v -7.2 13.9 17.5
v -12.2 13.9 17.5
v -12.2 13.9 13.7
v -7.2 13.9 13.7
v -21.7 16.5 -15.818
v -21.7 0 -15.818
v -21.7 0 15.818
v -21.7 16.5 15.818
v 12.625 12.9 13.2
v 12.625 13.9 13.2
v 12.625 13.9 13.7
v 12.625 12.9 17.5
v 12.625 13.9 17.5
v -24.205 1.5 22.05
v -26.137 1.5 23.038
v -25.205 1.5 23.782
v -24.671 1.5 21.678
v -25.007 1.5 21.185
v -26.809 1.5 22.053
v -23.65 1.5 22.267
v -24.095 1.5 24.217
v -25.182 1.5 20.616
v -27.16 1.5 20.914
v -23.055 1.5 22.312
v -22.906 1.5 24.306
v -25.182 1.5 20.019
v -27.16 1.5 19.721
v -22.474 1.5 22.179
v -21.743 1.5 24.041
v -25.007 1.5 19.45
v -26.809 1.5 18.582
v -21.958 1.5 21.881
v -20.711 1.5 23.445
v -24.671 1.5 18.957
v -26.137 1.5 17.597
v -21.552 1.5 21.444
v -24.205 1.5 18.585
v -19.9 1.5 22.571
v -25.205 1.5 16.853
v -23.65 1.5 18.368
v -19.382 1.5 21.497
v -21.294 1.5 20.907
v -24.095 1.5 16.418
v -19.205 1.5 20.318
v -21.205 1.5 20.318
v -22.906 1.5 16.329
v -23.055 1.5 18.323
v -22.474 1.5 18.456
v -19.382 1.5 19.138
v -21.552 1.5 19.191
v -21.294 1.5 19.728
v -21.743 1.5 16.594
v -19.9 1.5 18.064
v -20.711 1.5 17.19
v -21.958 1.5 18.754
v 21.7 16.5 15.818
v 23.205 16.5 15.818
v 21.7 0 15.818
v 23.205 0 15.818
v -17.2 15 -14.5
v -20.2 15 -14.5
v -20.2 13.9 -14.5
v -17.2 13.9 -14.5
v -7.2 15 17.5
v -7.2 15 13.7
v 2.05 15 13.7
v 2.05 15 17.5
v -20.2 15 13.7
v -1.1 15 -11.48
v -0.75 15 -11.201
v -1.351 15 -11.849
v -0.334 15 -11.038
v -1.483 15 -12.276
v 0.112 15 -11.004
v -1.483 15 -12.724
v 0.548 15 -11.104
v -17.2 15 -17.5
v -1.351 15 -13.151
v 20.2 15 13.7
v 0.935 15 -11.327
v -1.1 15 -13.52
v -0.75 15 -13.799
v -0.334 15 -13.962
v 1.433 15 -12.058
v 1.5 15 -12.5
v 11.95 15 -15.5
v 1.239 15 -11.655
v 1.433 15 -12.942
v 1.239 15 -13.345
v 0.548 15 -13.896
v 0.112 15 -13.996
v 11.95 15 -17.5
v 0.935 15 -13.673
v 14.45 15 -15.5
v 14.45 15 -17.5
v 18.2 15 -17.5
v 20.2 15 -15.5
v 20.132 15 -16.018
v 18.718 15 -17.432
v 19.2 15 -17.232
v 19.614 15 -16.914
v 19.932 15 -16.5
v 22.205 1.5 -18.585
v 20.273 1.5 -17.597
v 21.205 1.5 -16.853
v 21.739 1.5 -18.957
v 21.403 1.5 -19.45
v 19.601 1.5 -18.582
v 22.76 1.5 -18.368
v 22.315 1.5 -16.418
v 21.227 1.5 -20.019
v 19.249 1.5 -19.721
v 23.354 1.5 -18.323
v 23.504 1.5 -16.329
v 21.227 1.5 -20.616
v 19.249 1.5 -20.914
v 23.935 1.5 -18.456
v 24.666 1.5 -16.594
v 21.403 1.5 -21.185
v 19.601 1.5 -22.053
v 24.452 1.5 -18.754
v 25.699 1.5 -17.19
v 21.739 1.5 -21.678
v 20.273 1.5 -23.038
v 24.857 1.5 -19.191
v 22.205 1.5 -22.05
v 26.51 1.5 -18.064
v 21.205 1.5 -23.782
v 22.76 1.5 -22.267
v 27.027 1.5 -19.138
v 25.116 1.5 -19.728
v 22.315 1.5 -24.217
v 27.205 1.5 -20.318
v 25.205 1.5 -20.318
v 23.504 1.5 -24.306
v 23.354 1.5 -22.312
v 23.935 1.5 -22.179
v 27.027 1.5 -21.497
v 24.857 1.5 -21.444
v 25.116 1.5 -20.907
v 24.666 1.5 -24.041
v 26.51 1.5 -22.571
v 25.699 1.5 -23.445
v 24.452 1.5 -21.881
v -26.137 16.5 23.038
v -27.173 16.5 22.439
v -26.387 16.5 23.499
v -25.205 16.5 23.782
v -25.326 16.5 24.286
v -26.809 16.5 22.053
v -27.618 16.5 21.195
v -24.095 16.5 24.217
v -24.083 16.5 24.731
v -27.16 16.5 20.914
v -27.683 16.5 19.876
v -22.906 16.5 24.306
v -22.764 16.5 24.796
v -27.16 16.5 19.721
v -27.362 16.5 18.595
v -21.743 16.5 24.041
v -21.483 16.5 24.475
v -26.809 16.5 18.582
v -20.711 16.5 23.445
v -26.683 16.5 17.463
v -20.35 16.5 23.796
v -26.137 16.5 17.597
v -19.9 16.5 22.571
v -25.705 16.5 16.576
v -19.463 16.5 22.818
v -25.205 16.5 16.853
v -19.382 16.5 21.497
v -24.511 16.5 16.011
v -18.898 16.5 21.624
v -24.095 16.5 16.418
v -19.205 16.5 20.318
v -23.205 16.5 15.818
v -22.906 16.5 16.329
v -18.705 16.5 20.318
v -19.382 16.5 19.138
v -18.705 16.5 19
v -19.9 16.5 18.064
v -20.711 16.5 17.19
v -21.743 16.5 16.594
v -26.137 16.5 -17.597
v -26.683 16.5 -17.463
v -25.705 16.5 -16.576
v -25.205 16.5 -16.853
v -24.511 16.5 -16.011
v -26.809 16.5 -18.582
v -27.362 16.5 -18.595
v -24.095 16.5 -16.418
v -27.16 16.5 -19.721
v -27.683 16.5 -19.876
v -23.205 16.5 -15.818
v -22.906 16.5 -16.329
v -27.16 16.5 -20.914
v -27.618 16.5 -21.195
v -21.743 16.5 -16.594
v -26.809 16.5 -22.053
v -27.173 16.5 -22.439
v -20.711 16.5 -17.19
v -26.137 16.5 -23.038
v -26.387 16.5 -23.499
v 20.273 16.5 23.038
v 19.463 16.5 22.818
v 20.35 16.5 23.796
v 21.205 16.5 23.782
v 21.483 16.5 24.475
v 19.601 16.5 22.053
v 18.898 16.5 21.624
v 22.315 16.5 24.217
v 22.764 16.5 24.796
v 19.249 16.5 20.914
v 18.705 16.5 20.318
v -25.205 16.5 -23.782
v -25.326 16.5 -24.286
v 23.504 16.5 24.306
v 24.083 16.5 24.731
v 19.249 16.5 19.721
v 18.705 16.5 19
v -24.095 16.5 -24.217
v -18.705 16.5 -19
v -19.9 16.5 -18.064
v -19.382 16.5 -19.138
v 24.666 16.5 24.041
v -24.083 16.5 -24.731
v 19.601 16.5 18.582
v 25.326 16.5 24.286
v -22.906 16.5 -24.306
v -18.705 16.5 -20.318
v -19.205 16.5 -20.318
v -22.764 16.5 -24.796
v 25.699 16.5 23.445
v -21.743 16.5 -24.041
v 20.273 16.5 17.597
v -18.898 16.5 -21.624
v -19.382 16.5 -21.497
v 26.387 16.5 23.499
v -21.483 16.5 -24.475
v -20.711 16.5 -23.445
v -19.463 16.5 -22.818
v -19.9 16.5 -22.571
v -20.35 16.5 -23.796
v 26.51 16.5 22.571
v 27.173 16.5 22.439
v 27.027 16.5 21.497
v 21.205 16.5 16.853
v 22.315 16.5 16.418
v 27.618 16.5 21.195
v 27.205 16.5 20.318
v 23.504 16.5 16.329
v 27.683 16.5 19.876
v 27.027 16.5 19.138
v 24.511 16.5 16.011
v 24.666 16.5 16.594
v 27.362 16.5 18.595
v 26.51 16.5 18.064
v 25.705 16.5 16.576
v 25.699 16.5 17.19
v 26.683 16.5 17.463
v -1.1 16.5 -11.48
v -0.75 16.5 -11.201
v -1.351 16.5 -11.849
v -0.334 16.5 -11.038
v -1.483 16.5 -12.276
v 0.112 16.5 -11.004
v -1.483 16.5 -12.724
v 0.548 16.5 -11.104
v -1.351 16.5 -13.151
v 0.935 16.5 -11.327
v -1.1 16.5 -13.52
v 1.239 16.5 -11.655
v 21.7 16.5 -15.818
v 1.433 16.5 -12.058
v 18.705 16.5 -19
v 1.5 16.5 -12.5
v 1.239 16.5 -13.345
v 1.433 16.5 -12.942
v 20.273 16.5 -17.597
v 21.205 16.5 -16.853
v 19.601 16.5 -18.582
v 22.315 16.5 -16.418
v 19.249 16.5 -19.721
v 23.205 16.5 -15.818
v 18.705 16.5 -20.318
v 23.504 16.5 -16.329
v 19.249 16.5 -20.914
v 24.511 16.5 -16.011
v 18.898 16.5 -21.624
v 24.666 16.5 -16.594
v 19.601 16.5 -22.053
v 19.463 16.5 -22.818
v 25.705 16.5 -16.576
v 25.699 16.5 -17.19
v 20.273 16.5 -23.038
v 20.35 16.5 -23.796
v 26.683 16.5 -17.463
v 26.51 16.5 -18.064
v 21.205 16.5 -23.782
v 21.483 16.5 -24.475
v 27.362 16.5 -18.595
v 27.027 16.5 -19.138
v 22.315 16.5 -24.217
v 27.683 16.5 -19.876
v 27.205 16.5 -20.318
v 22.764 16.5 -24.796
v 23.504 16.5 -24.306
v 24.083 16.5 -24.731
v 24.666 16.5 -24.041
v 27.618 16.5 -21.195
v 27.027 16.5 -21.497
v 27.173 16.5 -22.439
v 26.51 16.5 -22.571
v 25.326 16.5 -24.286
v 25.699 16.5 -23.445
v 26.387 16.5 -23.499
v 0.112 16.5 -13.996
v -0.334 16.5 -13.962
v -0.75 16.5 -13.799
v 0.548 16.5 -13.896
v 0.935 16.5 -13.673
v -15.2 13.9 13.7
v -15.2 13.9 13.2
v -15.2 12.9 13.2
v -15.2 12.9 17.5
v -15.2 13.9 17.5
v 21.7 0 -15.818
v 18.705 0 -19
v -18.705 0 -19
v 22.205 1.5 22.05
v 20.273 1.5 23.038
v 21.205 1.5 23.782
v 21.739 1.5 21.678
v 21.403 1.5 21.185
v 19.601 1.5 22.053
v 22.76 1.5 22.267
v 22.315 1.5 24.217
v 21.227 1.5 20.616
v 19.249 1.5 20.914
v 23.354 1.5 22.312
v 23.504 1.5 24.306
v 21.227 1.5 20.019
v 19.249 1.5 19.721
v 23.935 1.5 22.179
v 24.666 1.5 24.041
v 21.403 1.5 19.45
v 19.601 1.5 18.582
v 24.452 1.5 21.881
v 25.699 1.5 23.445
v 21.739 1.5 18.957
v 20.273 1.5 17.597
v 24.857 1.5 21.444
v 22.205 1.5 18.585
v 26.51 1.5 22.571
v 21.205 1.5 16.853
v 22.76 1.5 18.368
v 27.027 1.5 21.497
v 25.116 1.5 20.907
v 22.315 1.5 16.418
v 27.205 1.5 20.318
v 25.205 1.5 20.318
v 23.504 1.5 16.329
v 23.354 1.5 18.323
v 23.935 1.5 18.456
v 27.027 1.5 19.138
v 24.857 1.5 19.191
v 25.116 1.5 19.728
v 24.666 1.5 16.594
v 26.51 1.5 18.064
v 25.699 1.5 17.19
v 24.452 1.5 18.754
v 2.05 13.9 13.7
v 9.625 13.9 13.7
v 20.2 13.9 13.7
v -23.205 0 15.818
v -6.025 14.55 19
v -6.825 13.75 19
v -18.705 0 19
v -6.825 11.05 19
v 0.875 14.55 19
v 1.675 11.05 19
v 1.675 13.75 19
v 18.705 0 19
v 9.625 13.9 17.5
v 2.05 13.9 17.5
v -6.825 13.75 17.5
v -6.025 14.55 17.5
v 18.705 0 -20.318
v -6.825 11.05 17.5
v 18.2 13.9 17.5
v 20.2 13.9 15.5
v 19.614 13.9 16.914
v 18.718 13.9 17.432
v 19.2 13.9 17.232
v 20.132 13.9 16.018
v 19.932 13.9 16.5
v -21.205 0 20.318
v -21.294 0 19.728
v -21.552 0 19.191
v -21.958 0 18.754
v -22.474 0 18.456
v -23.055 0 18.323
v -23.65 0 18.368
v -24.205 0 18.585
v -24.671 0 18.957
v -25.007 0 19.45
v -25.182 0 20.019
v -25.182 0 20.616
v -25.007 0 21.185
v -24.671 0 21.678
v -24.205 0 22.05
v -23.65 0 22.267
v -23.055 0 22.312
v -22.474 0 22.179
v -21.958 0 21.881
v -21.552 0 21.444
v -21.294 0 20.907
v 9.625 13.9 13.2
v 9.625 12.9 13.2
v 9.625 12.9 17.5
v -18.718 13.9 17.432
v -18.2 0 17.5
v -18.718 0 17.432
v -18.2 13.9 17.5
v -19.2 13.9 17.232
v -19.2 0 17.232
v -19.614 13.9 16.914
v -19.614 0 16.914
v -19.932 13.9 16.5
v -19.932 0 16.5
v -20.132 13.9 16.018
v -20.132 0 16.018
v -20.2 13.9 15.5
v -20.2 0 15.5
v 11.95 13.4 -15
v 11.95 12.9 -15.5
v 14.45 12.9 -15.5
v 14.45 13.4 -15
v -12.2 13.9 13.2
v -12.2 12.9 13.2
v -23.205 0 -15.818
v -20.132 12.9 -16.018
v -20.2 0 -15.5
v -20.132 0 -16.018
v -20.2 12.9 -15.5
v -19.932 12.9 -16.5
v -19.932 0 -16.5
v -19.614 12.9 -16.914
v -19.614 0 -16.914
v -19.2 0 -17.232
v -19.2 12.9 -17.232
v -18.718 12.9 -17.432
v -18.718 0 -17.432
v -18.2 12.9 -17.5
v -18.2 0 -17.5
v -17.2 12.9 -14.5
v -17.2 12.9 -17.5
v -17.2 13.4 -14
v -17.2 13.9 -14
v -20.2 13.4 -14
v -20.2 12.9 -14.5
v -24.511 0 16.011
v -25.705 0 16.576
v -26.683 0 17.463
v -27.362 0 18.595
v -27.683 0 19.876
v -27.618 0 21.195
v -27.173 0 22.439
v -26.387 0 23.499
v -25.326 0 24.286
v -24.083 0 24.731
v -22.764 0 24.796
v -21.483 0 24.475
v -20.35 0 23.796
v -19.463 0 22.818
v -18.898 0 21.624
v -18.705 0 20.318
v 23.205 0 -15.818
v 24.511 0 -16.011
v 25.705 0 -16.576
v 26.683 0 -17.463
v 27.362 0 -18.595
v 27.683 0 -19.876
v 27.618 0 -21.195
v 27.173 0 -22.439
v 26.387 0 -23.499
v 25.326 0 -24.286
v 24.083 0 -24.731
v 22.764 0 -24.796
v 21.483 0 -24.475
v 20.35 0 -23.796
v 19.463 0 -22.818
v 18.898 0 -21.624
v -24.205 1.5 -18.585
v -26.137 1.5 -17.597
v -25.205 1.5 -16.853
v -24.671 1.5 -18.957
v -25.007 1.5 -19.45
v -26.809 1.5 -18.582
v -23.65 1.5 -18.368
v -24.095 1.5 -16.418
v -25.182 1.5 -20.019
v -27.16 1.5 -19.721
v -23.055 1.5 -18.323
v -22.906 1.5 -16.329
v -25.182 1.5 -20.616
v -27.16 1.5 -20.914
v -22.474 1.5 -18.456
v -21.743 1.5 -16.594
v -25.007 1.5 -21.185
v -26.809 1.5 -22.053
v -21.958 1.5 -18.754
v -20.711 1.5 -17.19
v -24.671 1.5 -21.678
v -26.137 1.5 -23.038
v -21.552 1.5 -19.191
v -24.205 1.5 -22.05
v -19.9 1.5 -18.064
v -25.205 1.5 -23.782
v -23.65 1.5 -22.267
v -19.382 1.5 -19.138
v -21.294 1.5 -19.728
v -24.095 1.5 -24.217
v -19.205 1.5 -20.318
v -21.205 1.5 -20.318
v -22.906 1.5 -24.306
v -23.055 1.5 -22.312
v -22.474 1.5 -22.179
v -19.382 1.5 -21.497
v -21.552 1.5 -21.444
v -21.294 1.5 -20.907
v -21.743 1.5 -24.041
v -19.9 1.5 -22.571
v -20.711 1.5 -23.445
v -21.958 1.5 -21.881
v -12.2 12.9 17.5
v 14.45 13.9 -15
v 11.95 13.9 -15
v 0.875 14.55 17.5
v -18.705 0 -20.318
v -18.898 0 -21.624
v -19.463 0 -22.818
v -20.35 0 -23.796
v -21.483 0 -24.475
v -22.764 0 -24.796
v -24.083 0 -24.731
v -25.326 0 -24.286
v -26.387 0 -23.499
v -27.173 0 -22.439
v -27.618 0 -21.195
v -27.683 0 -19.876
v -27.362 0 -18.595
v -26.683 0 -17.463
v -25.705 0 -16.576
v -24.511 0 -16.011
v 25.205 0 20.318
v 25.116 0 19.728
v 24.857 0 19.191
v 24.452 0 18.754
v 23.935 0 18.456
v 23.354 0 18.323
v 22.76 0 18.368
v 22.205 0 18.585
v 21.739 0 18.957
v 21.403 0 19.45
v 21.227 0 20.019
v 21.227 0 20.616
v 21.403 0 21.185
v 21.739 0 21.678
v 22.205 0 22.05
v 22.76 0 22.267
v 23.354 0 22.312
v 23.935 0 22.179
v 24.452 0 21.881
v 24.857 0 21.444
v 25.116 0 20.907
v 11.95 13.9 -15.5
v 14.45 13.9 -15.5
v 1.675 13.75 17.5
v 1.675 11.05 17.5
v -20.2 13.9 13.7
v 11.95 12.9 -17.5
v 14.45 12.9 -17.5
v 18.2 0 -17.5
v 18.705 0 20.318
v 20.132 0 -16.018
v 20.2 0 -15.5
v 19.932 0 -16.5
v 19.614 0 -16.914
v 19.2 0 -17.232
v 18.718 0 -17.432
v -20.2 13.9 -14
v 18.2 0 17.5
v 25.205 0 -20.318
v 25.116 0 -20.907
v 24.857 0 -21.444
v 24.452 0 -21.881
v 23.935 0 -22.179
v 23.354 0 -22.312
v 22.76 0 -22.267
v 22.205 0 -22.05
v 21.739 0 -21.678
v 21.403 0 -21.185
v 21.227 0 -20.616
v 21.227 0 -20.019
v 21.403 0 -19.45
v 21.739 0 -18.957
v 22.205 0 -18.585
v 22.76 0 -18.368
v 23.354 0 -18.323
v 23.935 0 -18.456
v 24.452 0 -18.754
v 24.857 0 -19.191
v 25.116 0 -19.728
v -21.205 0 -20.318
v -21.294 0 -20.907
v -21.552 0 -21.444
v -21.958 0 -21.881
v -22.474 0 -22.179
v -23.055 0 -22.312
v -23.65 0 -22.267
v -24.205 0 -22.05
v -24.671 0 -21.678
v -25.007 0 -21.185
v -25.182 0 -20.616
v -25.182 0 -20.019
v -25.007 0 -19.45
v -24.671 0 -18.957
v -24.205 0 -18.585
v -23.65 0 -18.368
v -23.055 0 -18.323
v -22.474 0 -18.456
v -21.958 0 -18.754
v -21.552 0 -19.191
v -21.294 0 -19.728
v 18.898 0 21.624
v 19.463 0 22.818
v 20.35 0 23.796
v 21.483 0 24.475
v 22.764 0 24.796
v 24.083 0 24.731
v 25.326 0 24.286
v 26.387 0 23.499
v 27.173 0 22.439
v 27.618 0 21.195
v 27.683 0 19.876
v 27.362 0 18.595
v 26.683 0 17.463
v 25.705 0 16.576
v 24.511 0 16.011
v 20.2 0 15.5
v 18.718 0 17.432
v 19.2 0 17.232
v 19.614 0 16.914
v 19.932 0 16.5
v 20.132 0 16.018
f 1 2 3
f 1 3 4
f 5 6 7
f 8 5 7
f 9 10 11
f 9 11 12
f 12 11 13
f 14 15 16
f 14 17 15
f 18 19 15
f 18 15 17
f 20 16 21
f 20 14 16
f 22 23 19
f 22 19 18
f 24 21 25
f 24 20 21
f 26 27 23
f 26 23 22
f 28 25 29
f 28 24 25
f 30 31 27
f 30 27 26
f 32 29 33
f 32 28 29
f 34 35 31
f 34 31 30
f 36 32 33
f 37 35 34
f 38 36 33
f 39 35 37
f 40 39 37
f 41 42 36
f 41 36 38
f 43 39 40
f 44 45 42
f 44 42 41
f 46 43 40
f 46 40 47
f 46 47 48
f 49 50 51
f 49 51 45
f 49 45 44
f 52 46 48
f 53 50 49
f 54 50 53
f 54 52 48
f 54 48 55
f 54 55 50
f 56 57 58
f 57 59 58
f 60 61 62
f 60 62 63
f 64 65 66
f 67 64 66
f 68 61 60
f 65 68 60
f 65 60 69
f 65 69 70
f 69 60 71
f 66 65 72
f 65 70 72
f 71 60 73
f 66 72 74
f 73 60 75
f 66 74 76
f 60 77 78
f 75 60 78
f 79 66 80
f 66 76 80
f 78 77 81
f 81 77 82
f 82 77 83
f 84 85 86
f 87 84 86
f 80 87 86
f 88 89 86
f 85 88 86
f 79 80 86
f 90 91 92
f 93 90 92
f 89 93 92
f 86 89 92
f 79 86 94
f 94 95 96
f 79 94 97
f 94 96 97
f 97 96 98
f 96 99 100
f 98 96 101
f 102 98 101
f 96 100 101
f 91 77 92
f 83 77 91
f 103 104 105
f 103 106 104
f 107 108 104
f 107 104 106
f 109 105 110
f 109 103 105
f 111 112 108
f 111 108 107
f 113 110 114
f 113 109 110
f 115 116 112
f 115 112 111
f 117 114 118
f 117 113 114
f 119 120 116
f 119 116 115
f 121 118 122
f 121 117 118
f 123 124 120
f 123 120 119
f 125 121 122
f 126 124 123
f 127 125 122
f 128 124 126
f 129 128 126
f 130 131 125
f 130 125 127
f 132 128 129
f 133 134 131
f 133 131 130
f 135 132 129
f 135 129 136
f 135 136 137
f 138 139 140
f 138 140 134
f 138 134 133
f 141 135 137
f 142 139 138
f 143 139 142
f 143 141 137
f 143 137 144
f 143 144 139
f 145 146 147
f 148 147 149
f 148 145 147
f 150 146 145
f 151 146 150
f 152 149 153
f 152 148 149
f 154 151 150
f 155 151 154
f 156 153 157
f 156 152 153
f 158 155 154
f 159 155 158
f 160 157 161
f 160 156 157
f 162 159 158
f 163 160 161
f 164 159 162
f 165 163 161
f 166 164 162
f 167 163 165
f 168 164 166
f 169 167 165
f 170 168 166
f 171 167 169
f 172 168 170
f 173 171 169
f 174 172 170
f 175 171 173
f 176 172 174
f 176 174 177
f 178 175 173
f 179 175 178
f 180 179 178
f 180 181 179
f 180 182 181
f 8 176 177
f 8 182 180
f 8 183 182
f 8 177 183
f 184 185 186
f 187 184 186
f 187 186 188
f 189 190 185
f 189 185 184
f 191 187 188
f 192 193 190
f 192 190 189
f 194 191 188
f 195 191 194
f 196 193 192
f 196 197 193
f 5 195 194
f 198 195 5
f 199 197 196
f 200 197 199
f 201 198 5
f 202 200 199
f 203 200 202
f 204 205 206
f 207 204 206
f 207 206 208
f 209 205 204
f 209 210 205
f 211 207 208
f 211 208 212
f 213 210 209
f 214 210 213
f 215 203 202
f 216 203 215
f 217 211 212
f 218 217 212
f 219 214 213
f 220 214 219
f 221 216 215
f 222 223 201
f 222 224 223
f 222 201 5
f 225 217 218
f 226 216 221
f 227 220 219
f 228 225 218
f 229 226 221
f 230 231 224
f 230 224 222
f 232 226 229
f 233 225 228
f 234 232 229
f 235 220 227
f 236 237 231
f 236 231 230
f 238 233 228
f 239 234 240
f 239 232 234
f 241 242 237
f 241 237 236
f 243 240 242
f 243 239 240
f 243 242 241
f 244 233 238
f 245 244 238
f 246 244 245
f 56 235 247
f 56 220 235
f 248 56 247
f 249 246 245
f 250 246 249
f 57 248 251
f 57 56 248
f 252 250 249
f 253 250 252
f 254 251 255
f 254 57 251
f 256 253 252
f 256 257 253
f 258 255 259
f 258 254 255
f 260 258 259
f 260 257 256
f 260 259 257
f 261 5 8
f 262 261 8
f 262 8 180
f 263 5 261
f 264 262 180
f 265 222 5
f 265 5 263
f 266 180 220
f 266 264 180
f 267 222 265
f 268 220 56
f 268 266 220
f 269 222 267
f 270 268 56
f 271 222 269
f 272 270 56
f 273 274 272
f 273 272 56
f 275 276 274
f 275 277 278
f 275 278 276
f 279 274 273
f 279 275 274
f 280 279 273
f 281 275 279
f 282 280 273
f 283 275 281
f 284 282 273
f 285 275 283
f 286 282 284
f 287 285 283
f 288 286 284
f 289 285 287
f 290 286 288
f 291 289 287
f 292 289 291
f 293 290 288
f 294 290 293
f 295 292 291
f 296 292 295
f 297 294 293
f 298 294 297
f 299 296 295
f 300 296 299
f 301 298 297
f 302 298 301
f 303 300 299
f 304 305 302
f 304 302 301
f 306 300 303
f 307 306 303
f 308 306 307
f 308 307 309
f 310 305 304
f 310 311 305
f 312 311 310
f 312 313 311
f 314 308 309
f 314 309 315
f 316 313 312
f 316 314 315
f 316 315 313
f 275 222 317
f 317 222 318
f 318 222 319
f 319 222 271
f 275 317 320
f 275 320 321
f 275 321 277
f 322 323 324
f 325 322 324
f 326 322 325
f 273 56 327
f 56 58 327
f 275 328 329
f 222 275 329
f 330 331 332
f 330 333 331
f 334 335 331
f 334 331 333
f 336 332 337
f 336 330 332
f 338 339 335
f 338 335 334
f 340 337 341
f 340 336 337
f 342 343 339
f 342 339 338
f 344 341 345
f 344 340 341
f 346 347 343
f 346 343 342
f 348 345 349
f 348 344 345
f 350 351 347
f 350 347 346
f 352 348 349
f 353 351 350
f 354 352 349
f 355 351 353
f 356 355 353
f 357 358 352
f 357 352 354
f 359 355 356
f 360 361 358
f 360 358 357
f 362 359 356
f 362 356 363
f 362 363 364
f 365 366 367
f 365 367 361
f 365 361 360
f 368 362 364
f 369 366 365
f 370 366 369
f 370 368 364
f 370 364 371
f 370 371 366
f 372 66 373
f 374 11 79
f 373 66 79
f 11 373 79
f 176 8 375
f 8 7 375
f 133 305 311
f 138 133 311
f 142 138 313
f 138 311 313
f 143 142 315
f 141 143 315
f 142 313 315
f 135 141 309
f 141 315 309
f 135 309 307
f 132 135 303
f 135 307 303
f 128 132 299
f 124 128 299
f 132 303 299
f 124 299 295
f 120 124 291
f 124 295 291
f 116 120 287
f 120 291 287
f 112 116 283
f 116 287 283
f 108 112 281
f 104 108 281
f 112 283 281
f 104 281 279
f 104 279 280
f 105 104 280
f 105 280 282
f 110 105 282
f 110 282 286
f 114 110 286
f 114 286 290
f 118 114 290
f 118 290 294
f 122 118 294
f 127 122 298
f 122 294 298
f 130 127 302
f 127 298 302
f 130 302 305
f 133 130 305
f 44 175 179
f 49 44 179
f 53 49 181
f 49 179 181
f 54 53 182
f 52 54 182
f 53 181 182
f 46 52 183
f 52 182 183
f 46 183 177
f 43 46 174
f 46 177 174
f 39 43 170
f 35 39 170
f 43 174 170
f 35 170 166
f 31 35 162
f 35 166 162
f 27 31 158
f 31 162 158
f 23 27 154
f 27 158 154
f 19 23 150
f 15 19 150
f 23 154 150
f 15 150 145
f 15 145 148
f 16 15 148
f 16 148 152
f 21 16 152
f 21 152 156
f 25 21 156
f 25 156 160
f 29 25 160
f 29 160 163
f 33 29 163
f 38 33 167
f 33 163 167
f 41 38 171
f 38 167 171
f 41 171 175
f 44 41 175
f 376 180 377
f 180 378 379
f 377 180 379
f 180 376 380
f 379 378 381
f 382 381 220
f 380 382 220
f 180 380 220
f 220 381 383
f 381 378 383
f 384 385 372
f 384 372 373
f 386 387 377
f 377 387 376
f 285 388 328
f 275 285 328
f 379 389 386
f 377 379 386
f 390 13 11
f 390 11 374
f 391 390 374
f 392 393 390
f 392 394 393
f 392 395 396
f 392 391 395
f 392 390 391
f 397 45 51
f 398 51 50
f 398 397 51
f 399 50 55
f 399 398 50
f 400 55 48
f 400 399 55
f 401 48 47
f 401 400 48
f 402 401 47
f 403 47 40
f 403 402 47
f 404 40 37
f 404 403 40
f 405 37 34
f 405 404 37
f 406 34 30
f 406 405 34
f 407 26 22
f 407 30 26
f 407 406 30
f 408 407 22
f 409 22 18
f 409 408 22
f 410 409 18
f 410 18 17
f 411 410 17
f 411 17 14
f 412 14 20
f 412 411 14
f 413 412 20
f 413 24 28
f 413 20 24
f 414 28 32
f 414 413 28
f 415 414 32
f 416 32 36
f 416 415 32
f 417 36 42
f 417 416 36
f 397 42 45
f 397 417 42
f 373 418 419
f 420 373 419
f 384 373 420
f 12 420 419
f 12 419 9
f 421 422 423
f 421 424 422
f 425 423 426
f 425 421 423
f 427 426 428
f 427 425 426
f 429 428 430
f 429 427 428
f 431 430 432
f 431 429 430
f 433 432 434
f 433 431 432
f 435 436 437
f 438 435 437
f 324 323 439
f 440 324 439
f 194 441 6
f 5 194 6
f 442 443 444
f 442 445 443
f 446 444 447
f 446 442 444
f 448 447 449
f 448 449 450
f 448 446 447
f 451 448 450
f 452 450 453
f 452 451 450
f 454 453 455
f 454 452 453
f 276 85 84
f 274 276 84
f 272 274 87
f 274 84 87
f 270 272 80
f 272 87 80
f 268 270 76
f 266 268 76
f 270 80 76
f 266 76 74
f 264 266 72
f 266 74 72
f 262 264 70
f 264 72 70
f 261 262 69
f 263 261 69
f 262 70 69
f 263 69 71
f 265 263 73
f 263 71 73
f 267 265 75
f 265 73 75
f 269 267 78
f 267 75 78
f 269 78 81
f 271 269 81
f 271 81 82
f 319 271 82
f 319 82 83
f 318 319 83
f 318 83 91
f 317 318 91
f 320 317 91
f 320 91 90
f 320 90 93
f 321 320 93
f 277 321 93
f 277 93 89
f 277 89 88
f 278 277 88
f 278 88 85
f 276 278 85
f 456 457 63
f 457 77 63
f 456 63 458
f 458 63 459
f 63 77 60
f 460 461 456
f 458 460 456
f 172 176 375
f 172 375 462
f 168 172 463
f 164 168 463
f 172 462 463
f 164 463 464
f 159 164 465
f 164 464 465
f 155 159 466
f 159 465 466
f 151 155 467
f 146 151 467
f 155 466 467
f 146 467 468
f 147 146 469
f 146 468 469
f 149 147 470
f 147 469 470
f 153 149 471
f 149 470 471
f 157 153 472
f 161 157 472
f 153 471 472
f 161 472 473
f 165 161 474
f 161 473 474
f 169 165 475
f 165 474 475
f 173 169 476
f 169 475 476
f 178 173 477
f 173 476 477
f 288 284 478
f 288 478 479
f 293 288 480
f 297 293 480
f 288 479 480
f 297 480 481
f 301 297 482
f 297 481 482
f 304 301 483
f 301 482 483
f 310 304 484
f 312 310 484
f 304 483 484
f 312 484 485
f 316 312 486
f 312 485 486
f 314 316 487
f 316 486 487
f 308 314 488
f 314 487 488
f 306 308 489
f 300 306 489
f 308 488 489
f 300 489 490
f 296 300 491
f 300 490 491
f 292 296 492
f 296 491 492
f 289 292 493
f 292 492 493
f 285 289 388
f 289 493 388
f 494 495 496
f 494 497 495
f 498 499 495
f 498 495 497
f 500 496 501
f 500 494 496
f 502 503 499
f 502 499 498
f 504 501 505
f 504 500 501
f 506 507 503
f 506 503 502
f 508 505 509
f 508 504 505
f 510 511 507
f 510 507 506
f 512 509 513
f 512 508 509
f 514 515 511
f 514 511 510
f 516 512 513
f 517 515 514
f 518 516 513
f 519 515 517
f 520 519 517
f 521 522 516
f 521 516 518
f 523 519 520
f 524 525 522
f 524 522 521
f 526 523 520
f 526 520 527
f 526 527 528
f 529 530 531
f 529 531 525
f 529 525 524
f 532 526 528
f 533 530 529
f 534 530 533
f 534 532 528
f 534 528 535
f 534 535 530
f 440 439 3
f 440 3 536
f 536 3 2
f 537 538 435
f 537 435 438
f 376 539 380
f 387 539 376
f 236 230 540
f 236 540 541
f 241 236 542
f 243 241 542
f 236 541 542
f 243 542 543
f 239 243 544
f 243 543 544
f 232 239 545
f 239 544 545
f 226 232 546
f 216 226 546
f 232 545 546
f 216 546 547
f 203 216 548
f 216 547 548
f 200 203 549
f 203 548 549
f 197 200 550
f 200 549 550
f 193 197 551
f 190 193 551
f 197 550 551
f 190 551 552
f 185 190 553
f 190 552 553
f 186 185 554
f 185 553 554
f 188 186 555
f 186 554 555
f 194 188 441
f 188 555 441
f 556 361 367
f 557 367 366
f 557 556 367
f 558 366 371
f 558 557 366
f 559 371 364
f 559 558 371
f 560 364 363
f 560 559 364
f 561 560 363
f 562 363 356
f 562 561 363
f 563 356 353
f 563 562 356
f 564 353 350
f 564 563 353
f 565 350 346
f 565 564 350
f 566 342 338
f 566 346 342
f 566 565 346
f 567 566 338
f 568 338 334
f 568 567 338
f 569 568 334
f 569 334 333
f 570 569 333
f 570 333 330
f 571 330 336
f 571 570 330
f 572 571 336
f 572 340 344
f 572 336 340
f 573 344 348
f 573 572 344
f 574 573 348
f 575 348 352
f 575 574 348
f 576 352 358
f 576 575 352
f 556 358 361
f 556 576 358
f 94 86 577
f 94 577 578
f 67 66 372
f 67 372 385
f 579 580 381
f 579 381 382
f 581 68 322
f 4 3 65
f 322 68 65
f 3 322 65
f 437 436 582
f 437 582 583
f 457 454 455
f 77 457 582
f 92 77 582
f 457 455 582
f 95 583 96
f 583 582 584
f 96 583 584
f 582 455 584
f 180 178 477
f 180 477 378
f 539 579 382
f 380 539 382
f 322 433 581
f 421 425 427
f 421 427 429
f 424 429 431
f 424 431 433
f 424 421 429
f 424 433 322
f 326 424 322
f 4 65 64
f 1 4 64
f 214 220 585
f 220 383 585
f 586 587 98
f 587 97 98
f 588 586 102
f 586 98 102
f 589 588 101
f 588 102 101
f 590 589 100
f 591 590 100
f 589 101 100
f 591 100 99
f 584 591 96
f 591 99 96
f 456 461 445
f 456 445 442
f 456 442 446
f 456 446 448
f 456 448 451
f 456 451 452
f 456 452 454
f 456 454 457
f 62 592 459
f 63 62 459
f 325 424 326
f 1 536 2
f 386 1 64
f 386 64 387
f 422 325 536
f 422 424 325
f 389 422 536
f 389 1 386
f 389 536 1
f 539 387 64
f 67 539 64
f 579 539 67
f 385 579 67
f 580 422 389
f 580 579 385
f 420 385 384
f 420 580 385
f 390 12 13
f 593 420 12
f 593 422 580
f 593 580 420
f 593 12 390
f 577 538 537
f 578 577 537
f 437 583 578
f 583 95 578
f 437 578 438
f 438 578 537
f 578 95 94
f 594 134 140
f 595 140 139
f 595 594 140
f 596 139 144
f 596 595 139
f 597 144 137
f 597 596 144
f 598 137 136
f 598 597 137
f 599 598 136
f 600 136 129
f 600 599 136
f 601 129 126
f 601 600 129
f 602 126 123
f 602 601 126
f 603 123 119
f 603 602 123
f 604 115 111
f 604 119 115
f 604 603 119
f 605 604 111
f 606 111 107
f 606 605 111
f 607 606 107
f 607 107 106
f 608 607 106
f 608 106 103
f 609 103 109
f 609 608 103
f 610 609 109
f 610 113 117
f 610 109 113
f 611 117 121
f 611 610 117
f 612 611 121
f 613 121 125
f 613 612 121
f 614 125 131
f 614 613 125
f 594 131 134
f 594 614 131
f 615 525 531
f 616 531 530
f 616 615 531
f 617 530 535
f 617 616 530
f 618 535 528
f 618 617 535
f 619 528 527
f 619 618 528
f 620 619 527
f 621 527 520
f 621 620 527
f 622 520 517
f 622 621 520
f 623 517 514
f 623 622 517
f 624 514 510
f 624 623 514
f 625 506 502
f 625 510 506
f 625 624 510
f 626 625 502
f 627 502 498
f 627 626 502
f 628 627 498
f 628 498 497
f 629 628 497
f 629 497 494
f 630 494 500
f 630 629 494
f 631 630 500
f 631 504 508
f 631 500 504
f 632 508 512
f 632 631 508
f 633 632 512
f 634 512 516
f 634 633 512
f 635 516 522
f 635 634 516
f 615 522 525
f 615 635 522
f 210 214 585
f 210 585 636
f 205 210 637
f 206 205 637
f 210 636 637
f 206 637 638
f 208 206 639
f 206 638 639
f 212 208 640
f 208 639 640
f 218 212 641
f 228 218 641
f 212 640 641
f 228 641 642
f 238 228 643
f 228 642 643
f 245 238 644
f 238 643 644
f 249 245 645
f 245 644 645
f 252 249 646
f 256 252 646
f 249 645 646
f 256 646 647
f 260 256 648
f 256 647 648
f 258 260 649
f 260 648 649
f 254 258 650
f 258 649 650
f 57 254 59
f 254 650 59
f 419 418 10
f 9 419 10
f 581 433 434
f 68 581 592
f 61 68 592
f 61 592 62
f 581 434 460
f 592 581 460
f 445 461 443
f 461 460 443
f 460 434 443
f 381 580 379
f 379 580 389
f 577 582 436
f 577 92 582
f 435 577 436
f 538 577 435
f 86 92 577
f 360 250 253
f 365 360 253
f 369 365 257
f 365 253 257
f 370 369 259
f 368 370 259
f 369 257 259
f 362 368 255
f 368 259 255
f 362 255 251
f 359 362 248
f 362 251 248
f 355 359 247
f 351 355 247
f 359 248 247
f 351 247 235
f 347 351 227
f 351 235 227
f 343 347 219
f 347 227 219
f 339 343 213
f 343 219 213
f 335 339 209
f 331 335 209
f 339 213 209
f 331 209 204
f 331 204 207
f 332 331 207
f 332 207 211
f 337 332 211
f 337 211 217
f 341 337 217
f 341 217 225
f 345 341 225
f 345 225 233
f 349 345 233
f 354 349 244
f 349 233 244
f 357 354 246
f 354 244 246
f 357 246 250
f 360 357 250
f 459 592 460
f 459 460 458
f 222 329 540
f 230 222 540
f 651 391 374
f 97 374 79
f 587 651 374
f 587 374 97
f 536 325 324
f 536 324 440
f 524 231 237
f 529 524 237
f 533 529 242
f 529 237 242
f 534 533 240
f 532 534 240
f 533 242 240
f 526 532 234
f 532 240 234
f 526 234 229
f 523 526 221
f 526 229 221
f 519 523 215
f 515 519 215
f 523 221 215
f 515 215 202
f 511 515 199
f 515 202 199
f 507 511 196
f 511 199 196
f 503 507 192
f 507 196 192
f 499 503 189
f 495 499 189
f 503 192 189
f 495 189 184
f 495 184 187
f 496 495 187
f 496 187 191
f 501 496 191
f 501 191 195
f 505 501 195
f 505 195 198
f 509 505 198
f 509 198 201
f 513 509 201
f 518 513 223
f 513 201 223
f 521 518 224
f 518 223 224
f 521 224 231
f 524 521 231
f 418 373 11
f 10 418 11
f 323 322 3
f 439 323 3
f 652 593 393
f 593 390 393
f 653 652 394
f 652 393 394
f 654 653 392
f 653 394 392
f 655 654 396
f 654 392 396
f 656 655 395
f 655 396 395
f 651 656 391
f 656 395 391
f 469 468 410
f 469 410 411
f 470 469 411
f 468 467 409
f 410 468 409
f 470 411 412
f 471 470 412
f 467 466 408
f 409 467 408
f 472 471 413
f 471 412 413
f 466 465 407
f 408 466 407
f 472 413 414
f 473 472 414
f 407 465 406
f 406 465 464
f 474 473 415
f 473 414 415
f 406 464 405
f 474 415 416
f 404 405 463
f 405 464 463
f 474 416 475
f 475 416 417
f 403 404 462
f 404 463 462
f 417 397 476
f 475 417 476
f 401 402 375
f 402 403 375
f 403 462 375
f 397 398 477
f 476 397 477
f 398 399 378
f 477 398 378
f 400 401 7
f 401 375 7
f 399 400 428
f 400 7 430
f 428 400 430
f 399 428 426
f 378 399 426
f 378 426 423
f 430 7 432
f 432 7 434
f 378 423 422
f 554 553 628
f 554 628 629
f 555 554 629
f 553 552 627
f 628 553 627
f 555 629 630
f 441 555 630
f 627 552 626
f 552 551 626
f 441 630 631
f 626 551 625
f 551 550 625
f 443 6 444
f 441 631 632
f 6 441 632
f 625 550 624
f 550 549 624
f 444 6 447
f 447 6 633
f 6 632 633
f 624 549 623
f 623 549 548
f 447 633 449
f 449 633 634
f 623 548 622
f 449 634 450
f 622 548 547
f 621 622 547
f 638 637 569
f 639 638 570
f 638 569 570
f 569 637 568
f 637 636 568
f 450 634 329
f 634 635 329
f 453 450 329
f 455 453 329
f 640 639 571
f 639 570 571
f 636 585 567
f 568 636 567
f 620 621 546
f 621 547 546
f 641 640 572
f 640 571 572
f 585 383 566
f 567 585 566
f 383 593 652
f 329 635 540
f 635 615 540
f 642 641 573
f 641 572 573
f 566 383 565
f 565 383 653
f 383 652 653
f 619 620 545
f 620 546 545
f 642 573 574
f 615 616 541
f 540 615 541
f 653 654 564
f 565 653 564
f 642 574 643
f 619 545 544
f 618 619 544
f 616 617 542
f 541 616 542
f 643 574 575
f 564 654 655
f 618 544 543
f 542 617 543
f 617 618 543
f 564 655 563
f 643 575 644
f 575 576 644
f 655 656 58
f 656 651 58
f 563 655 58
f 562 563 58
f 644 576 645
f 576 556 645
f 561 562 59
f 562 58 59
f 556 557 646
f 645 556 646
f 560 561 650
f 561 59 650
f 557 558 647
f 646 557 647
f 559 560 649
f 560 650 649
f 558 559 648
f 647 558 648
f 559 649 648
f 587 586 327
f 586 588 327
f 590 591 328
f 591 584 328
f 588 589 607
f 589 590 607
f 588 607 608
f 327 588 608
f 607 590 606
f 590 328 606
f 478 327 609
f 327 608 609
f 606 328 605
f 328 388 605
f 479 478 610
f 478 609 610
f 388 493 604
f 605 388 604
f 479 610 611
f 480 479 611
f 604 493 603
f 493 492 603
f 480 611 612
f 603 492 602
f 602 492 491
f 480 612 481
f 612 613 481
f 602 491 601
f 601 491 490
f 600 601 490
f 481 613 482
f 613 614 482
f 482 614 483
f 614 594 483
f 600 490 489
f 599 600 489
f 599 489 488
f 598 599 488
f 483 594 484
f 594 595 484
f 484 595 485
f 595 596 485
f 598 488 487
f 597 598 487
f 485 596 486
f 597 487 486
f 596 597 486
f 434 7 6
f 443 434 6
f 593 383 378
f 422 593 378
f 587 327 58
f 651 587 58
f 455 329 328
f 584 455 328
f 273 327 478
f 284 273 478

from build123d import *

# Parameters (mm, degrees)
SKETCH1_W           = 40.4
SKETCH1_H           = 35
SKETCH1_R           = 2
BOSS_EXTRUDE1_DEPTH = 15
SKETCH2_R           = 2
BOSS_EXTRUDE2_DEPTH = 1.5
SKETCH3_R           = 4
CUT_EXTRUDE1_DEPTH  = 15
SKETCH4_W           = 13
SKETCH4_H           = 3.8
SKETCH4_W_2         = 3
SKETCH4_H_2         = 3
SKETCH4_W_3         = 18.15
SKETCH4_W_4         = 2.5
SKETCH4_H_3         = 2
BOSS_EXTRUDE3_DEPTH = 1.1
SKETCH5_W           = 3
SKETCH5_H           = 3.5
SKETCH5_W_2         = 2.5
SKETCH5_H_2         = 2.5
SKETCH5_H_3         = 4.3
BOSS_EXTRUDE4_DEPTH = 1
CHAMFER1_SIZE       = 0.5
CUT_EXTRUDE2_REACH  = 9.318
SKETCH6_W           = 8.5
SKETCH6_H           = 3.5
CHAMFER2_SIZE       = 0.8
FILLET1_R           = 2
CUT_EXTRUDE3_REACH  = 3.5
SKETCH7_R           = 1.5


with BuildPart() as part:
    # Sketch1 → Boss-Extrude1 (new body)
    with BuildSketch(Plane(origin=(0, 0, 0), x_dir=(1, 0, 0), z_dir=(0, 1, 0))):
        with BuildLine():
            Line((-21.7, 15.817500063), (-21.7, -15.817500063))
            Line((-21.7, -15.817500063), (-23.204723756, -15.817500063))
            ThreePointArc((-23.204723756, -15.817500063), (-26.386704272, -23.499480579), (-18.704723756, -20.317500063))
            Line((-18.704723756, -20.317500063), (-18.704723756, -19))
            Line((-18.704723756, -19), (18.704723756, -19))
            Line((18.704723756, -19), (18.704723756, -20.317500063))
            ThreePointArc((18.704723756, -20.317500063), (26.386704272, -23.499480579), (23.204723756, -15.817500063))
            Line((23.204723756, -15.817500063), (21.7, -15.817500063))
            Line((21.7, -15.817500063), (21.7, 15.817500063))
            Line((21.7, 15.817500063), (23.204723756, 15.817500063))
            ThreePointArc((23.204723756, 15.817500063), (26.386704272, 23.499480579), (18.704723756, 20.317500063))
            Line((18.704723756, 20.317500063), (18.704723756, 19))
            Line((18.704723756, 19), (-18.704723756, 19))
            Line((-18.704723756, 19), (-18.704723756, 20.317500063))
            ThreePointArc((-18.704723756, 20.317500063), (-26.386704272, 23.499480579), (-23.204723756, 15.817500063))
            Line((-23.204723756, 15.817500063), (-21.7, 15.817500063))
        make_face()
        Rectangle(SKETCH1_W, SKETCH1_H, mode=Mode.SUBTRACT)
        with Locations((-23.204723756, 20.317500063)):
            Circle(SKETCH1_R, mode=Mode.SUBTRACT)
        with Locations((-23.204723756, -20.317500063)):
            Circle(SKETCH1_R, mode=Mode.SUBTRACT)
        with Locations((23.204723756, 20.317500063)):
            Circle(SKETCH1_R, mode=Mode.SUBTRACT)
        with Locations((23.204723756, -20.317500063)):
            Circle(SKETCH1_R, mode=Mode.SUBTRACT)
    extrude(amount=BOSS_EXTRUDE1_DEPTH)

    # Sketch2 → Boss-Extrude2 (add)
    with BuildSketch(Plane(origin=(0, 15, 0), x_dir=(1, 0, 0), z_dir=(0, 1, 0))):
        with BuildLine():
            Line((-21.7, 15.817500063), (-21.7, -15.817500063))
            Line((-21.7, -15.817500063), (-23.204723756, -15.817500063))
            ThreePointArc((-23.204723756, -15.817500063), (-26.386704272, -23.499480579), (-18.704723756, -20.317500063))
            Line((-18.704723756, -20.317500063), (-18.704723756, -19))
            Line((-18.704723756, -19), (18.704723756, -19))
            Line((18.704723756, -19), (18.704723756, -20.317500063))
            ThreePointArc((18.704723756, -20.317500063), (26.386704272, -23.499480579), (23.204723756, -15.817500063))
            Line((23.204723756, -15.817500063), (21.7, -15.817500063))
            Line((21.7, -15.817500063), (21.7, 15.817500063))
            Line((21.7, 15.817500063), (23.204723756, 15.817500063))
            ThreePointArc((23.204723756, 15.817500063), (26.386704272, 23.499480579), (18.704723756, 20.317500063))
            Line((18.704723756, 20.317500063), (18.704723756, 19))
            Line((18.704723756, 19), (-18.704723756, 19))
            Line((-18.704723756, 19), (-18.704723756, 20.317500063))
            ThreePointArc((-18.704723756, 20.317500063), (-26.386704272, 23.499480579), (-23.204723756, 15.817500063))
            Line((-23.204723756, 15.817500063), (-21.7, 15.817500063))
        make_face()
        with Locations((23.204723756, -20.317500063)):
            Circle(SKETCH2_R, mode=Mode.SUBTRACT)
        with Locations((23.204723756, 20.317500063)):
            Circle(SKETCH2_R, mode=Mode.SUBTRACT)
        with Locations((-23.204723756, 20.317500063)):
            Circle(SKETCH2_R, mode=Mode.SUBTRACT)
        with Locations((-23.204723756, -20.317500063)):
            Circle(SKETCH2_R, mode=Mode.SUBTRACT)
    extrude(amount=BOSS_EXTRUDE2_DEPTH)

    # Sketch3 → Cut-Extrude1 (cut)
    with BuildSketch(Plane(origin=(0, 16.5, 0), x_dir=(1, 0, 0), z_dir=(0, 1, 0))):
        with Locations((-23.204723756, -20.317500063)):
            Circle(SKETCH3_R)
        with Locations((-23.204723756, 20.317500063)):
            Circle(SKETCH3_R)
        with Locations((23.204723756, 20.317500063)):
            Circle(SKETCH3_R)
        with Locations((23.204723756, -20.317500063)):
            Circle(SKETCH3_R)
    extrude(amount=-CUT_EXTRUDE1_DEPTH, mode=Mode.SUBTRACT)

    # Sketch4 → Boss-Extrude3 (add)
    with BuildSketch(Plane.XZ.offset(-15)):
        with Locations((-13.7, 15.6)):
            Rectangle(SKETCH4_W, SKETCH4_H)
        with Locations((-18.7, -16)):
            Rectangle(SKETCH4_W_2, SKETCH4_H_2)
        with Locations((11.125, 15.6)):
            Rectangle(SKETCH4_W_3, SKETCH4_H)
        with Locations((13.2, -16.5)):
            Rectangle(SKETCH4_W_4, SKETCH4_H_3)
    extrude(amount=BOSS_EXTRUDE3_DEPTH)

    # Sketch5 → Boss-Extrude4 (add)
    with BuildSketch(Plane.XZ.offset(-13.9)):
        with Locations((-18.7, -15.75)):
            Rectangle(SKETCH5_W, SKETCH5_H)
        with Locations((13.2, -16.25)):
            Rectangle(SKETCH5_W_2, SKETCH5_H_2)
        with Locations((-13.7, 15.35)):
            Rectangle(SKETCH5_W, SKETCH5_H_3)
        with Locations((11.125, 15.35)):
            Rectangle(SKETCH5_W, SKETCH5_H_3)
    extrude(amount=BOSS_EXTRUDE4_DEPTH)

    # Chamfer1
    chamfer1_edges = [part.edges().sort_by_distance(p)[0] for p in [
        (-18.7, 12.9, -14),
        (13.2, 12.9, -15),
    ]]
    chamfer(chamfer1_edges, length=CHAMFER1_SIZE)

    # Sketch6 → Cut-Extrude2 (cut, up to next)
    with BuildSketch(Plane(origin=(0, 0, 17.5), x_dir=(-1, 0, 0), z_dir=(0, 0, -1)), mode=Mode.PRIVATE) as cut_extrude2_sk1:
        with Locations((2.575, 12.8)):
            Rectangle(SKETCH6_W, SKETCH6_H)
    cut_extrude2_tool1 = extrude(cut_extrude2_sk1.sketch, amount=-CUT_EXTRUDE2_REACH, mode=Mode.PRIVATE) & part.part
    add(cut_extrude2_tool1.solids().sort_by_distance((-2.575, 12.8, 17.5))[0], mode=Mode.SUBTRACT)

    # Chamfer2
    chamfer2_edges = [part.edges().sort_by_distance(p)[0] for p in [
        (-6.825, 14.55, 18.25),
        (1.675, 14.55, 18.25),
    ]]
    chamfer(chamfer2_edges, length=CHAMFER2_SIZE)

    # Fillet1
    fillet1_edges = [part.edges().sort_by_distance(p)[0] for p in [
        (-20.2, 6.95, 17.5),
        (20.2, 6.95, 17.5),
        (-20.2, 6.45, -17.5),
        (20.2, 7.5, -17.5),
    ]]
    fillet(fillet1_edges, radius=FILLET1_R)

    # Sketch7 → Cut-Extrude3 (cut, up to next)
    with BuildSketch(Plane.XZ.offset(-15), mode=Mode.PRIVATE) as cut_extrude3_sk1:
        with Locations((0, -12.5)):
            Circle(SKETCH7_R)
    cut_extrude3_tool1 = extrude(cut_extrude3_sk1.sketch, amount=-CUT_EXTRUDE3_REACH, mode=Mode.PRIVATE) & part.part
    add(cut_extrude3_tool1.solids().sort_by_distance((0, 15, -12.5))[0], mode=Mode.SUBTRACT)


solid = part.part
